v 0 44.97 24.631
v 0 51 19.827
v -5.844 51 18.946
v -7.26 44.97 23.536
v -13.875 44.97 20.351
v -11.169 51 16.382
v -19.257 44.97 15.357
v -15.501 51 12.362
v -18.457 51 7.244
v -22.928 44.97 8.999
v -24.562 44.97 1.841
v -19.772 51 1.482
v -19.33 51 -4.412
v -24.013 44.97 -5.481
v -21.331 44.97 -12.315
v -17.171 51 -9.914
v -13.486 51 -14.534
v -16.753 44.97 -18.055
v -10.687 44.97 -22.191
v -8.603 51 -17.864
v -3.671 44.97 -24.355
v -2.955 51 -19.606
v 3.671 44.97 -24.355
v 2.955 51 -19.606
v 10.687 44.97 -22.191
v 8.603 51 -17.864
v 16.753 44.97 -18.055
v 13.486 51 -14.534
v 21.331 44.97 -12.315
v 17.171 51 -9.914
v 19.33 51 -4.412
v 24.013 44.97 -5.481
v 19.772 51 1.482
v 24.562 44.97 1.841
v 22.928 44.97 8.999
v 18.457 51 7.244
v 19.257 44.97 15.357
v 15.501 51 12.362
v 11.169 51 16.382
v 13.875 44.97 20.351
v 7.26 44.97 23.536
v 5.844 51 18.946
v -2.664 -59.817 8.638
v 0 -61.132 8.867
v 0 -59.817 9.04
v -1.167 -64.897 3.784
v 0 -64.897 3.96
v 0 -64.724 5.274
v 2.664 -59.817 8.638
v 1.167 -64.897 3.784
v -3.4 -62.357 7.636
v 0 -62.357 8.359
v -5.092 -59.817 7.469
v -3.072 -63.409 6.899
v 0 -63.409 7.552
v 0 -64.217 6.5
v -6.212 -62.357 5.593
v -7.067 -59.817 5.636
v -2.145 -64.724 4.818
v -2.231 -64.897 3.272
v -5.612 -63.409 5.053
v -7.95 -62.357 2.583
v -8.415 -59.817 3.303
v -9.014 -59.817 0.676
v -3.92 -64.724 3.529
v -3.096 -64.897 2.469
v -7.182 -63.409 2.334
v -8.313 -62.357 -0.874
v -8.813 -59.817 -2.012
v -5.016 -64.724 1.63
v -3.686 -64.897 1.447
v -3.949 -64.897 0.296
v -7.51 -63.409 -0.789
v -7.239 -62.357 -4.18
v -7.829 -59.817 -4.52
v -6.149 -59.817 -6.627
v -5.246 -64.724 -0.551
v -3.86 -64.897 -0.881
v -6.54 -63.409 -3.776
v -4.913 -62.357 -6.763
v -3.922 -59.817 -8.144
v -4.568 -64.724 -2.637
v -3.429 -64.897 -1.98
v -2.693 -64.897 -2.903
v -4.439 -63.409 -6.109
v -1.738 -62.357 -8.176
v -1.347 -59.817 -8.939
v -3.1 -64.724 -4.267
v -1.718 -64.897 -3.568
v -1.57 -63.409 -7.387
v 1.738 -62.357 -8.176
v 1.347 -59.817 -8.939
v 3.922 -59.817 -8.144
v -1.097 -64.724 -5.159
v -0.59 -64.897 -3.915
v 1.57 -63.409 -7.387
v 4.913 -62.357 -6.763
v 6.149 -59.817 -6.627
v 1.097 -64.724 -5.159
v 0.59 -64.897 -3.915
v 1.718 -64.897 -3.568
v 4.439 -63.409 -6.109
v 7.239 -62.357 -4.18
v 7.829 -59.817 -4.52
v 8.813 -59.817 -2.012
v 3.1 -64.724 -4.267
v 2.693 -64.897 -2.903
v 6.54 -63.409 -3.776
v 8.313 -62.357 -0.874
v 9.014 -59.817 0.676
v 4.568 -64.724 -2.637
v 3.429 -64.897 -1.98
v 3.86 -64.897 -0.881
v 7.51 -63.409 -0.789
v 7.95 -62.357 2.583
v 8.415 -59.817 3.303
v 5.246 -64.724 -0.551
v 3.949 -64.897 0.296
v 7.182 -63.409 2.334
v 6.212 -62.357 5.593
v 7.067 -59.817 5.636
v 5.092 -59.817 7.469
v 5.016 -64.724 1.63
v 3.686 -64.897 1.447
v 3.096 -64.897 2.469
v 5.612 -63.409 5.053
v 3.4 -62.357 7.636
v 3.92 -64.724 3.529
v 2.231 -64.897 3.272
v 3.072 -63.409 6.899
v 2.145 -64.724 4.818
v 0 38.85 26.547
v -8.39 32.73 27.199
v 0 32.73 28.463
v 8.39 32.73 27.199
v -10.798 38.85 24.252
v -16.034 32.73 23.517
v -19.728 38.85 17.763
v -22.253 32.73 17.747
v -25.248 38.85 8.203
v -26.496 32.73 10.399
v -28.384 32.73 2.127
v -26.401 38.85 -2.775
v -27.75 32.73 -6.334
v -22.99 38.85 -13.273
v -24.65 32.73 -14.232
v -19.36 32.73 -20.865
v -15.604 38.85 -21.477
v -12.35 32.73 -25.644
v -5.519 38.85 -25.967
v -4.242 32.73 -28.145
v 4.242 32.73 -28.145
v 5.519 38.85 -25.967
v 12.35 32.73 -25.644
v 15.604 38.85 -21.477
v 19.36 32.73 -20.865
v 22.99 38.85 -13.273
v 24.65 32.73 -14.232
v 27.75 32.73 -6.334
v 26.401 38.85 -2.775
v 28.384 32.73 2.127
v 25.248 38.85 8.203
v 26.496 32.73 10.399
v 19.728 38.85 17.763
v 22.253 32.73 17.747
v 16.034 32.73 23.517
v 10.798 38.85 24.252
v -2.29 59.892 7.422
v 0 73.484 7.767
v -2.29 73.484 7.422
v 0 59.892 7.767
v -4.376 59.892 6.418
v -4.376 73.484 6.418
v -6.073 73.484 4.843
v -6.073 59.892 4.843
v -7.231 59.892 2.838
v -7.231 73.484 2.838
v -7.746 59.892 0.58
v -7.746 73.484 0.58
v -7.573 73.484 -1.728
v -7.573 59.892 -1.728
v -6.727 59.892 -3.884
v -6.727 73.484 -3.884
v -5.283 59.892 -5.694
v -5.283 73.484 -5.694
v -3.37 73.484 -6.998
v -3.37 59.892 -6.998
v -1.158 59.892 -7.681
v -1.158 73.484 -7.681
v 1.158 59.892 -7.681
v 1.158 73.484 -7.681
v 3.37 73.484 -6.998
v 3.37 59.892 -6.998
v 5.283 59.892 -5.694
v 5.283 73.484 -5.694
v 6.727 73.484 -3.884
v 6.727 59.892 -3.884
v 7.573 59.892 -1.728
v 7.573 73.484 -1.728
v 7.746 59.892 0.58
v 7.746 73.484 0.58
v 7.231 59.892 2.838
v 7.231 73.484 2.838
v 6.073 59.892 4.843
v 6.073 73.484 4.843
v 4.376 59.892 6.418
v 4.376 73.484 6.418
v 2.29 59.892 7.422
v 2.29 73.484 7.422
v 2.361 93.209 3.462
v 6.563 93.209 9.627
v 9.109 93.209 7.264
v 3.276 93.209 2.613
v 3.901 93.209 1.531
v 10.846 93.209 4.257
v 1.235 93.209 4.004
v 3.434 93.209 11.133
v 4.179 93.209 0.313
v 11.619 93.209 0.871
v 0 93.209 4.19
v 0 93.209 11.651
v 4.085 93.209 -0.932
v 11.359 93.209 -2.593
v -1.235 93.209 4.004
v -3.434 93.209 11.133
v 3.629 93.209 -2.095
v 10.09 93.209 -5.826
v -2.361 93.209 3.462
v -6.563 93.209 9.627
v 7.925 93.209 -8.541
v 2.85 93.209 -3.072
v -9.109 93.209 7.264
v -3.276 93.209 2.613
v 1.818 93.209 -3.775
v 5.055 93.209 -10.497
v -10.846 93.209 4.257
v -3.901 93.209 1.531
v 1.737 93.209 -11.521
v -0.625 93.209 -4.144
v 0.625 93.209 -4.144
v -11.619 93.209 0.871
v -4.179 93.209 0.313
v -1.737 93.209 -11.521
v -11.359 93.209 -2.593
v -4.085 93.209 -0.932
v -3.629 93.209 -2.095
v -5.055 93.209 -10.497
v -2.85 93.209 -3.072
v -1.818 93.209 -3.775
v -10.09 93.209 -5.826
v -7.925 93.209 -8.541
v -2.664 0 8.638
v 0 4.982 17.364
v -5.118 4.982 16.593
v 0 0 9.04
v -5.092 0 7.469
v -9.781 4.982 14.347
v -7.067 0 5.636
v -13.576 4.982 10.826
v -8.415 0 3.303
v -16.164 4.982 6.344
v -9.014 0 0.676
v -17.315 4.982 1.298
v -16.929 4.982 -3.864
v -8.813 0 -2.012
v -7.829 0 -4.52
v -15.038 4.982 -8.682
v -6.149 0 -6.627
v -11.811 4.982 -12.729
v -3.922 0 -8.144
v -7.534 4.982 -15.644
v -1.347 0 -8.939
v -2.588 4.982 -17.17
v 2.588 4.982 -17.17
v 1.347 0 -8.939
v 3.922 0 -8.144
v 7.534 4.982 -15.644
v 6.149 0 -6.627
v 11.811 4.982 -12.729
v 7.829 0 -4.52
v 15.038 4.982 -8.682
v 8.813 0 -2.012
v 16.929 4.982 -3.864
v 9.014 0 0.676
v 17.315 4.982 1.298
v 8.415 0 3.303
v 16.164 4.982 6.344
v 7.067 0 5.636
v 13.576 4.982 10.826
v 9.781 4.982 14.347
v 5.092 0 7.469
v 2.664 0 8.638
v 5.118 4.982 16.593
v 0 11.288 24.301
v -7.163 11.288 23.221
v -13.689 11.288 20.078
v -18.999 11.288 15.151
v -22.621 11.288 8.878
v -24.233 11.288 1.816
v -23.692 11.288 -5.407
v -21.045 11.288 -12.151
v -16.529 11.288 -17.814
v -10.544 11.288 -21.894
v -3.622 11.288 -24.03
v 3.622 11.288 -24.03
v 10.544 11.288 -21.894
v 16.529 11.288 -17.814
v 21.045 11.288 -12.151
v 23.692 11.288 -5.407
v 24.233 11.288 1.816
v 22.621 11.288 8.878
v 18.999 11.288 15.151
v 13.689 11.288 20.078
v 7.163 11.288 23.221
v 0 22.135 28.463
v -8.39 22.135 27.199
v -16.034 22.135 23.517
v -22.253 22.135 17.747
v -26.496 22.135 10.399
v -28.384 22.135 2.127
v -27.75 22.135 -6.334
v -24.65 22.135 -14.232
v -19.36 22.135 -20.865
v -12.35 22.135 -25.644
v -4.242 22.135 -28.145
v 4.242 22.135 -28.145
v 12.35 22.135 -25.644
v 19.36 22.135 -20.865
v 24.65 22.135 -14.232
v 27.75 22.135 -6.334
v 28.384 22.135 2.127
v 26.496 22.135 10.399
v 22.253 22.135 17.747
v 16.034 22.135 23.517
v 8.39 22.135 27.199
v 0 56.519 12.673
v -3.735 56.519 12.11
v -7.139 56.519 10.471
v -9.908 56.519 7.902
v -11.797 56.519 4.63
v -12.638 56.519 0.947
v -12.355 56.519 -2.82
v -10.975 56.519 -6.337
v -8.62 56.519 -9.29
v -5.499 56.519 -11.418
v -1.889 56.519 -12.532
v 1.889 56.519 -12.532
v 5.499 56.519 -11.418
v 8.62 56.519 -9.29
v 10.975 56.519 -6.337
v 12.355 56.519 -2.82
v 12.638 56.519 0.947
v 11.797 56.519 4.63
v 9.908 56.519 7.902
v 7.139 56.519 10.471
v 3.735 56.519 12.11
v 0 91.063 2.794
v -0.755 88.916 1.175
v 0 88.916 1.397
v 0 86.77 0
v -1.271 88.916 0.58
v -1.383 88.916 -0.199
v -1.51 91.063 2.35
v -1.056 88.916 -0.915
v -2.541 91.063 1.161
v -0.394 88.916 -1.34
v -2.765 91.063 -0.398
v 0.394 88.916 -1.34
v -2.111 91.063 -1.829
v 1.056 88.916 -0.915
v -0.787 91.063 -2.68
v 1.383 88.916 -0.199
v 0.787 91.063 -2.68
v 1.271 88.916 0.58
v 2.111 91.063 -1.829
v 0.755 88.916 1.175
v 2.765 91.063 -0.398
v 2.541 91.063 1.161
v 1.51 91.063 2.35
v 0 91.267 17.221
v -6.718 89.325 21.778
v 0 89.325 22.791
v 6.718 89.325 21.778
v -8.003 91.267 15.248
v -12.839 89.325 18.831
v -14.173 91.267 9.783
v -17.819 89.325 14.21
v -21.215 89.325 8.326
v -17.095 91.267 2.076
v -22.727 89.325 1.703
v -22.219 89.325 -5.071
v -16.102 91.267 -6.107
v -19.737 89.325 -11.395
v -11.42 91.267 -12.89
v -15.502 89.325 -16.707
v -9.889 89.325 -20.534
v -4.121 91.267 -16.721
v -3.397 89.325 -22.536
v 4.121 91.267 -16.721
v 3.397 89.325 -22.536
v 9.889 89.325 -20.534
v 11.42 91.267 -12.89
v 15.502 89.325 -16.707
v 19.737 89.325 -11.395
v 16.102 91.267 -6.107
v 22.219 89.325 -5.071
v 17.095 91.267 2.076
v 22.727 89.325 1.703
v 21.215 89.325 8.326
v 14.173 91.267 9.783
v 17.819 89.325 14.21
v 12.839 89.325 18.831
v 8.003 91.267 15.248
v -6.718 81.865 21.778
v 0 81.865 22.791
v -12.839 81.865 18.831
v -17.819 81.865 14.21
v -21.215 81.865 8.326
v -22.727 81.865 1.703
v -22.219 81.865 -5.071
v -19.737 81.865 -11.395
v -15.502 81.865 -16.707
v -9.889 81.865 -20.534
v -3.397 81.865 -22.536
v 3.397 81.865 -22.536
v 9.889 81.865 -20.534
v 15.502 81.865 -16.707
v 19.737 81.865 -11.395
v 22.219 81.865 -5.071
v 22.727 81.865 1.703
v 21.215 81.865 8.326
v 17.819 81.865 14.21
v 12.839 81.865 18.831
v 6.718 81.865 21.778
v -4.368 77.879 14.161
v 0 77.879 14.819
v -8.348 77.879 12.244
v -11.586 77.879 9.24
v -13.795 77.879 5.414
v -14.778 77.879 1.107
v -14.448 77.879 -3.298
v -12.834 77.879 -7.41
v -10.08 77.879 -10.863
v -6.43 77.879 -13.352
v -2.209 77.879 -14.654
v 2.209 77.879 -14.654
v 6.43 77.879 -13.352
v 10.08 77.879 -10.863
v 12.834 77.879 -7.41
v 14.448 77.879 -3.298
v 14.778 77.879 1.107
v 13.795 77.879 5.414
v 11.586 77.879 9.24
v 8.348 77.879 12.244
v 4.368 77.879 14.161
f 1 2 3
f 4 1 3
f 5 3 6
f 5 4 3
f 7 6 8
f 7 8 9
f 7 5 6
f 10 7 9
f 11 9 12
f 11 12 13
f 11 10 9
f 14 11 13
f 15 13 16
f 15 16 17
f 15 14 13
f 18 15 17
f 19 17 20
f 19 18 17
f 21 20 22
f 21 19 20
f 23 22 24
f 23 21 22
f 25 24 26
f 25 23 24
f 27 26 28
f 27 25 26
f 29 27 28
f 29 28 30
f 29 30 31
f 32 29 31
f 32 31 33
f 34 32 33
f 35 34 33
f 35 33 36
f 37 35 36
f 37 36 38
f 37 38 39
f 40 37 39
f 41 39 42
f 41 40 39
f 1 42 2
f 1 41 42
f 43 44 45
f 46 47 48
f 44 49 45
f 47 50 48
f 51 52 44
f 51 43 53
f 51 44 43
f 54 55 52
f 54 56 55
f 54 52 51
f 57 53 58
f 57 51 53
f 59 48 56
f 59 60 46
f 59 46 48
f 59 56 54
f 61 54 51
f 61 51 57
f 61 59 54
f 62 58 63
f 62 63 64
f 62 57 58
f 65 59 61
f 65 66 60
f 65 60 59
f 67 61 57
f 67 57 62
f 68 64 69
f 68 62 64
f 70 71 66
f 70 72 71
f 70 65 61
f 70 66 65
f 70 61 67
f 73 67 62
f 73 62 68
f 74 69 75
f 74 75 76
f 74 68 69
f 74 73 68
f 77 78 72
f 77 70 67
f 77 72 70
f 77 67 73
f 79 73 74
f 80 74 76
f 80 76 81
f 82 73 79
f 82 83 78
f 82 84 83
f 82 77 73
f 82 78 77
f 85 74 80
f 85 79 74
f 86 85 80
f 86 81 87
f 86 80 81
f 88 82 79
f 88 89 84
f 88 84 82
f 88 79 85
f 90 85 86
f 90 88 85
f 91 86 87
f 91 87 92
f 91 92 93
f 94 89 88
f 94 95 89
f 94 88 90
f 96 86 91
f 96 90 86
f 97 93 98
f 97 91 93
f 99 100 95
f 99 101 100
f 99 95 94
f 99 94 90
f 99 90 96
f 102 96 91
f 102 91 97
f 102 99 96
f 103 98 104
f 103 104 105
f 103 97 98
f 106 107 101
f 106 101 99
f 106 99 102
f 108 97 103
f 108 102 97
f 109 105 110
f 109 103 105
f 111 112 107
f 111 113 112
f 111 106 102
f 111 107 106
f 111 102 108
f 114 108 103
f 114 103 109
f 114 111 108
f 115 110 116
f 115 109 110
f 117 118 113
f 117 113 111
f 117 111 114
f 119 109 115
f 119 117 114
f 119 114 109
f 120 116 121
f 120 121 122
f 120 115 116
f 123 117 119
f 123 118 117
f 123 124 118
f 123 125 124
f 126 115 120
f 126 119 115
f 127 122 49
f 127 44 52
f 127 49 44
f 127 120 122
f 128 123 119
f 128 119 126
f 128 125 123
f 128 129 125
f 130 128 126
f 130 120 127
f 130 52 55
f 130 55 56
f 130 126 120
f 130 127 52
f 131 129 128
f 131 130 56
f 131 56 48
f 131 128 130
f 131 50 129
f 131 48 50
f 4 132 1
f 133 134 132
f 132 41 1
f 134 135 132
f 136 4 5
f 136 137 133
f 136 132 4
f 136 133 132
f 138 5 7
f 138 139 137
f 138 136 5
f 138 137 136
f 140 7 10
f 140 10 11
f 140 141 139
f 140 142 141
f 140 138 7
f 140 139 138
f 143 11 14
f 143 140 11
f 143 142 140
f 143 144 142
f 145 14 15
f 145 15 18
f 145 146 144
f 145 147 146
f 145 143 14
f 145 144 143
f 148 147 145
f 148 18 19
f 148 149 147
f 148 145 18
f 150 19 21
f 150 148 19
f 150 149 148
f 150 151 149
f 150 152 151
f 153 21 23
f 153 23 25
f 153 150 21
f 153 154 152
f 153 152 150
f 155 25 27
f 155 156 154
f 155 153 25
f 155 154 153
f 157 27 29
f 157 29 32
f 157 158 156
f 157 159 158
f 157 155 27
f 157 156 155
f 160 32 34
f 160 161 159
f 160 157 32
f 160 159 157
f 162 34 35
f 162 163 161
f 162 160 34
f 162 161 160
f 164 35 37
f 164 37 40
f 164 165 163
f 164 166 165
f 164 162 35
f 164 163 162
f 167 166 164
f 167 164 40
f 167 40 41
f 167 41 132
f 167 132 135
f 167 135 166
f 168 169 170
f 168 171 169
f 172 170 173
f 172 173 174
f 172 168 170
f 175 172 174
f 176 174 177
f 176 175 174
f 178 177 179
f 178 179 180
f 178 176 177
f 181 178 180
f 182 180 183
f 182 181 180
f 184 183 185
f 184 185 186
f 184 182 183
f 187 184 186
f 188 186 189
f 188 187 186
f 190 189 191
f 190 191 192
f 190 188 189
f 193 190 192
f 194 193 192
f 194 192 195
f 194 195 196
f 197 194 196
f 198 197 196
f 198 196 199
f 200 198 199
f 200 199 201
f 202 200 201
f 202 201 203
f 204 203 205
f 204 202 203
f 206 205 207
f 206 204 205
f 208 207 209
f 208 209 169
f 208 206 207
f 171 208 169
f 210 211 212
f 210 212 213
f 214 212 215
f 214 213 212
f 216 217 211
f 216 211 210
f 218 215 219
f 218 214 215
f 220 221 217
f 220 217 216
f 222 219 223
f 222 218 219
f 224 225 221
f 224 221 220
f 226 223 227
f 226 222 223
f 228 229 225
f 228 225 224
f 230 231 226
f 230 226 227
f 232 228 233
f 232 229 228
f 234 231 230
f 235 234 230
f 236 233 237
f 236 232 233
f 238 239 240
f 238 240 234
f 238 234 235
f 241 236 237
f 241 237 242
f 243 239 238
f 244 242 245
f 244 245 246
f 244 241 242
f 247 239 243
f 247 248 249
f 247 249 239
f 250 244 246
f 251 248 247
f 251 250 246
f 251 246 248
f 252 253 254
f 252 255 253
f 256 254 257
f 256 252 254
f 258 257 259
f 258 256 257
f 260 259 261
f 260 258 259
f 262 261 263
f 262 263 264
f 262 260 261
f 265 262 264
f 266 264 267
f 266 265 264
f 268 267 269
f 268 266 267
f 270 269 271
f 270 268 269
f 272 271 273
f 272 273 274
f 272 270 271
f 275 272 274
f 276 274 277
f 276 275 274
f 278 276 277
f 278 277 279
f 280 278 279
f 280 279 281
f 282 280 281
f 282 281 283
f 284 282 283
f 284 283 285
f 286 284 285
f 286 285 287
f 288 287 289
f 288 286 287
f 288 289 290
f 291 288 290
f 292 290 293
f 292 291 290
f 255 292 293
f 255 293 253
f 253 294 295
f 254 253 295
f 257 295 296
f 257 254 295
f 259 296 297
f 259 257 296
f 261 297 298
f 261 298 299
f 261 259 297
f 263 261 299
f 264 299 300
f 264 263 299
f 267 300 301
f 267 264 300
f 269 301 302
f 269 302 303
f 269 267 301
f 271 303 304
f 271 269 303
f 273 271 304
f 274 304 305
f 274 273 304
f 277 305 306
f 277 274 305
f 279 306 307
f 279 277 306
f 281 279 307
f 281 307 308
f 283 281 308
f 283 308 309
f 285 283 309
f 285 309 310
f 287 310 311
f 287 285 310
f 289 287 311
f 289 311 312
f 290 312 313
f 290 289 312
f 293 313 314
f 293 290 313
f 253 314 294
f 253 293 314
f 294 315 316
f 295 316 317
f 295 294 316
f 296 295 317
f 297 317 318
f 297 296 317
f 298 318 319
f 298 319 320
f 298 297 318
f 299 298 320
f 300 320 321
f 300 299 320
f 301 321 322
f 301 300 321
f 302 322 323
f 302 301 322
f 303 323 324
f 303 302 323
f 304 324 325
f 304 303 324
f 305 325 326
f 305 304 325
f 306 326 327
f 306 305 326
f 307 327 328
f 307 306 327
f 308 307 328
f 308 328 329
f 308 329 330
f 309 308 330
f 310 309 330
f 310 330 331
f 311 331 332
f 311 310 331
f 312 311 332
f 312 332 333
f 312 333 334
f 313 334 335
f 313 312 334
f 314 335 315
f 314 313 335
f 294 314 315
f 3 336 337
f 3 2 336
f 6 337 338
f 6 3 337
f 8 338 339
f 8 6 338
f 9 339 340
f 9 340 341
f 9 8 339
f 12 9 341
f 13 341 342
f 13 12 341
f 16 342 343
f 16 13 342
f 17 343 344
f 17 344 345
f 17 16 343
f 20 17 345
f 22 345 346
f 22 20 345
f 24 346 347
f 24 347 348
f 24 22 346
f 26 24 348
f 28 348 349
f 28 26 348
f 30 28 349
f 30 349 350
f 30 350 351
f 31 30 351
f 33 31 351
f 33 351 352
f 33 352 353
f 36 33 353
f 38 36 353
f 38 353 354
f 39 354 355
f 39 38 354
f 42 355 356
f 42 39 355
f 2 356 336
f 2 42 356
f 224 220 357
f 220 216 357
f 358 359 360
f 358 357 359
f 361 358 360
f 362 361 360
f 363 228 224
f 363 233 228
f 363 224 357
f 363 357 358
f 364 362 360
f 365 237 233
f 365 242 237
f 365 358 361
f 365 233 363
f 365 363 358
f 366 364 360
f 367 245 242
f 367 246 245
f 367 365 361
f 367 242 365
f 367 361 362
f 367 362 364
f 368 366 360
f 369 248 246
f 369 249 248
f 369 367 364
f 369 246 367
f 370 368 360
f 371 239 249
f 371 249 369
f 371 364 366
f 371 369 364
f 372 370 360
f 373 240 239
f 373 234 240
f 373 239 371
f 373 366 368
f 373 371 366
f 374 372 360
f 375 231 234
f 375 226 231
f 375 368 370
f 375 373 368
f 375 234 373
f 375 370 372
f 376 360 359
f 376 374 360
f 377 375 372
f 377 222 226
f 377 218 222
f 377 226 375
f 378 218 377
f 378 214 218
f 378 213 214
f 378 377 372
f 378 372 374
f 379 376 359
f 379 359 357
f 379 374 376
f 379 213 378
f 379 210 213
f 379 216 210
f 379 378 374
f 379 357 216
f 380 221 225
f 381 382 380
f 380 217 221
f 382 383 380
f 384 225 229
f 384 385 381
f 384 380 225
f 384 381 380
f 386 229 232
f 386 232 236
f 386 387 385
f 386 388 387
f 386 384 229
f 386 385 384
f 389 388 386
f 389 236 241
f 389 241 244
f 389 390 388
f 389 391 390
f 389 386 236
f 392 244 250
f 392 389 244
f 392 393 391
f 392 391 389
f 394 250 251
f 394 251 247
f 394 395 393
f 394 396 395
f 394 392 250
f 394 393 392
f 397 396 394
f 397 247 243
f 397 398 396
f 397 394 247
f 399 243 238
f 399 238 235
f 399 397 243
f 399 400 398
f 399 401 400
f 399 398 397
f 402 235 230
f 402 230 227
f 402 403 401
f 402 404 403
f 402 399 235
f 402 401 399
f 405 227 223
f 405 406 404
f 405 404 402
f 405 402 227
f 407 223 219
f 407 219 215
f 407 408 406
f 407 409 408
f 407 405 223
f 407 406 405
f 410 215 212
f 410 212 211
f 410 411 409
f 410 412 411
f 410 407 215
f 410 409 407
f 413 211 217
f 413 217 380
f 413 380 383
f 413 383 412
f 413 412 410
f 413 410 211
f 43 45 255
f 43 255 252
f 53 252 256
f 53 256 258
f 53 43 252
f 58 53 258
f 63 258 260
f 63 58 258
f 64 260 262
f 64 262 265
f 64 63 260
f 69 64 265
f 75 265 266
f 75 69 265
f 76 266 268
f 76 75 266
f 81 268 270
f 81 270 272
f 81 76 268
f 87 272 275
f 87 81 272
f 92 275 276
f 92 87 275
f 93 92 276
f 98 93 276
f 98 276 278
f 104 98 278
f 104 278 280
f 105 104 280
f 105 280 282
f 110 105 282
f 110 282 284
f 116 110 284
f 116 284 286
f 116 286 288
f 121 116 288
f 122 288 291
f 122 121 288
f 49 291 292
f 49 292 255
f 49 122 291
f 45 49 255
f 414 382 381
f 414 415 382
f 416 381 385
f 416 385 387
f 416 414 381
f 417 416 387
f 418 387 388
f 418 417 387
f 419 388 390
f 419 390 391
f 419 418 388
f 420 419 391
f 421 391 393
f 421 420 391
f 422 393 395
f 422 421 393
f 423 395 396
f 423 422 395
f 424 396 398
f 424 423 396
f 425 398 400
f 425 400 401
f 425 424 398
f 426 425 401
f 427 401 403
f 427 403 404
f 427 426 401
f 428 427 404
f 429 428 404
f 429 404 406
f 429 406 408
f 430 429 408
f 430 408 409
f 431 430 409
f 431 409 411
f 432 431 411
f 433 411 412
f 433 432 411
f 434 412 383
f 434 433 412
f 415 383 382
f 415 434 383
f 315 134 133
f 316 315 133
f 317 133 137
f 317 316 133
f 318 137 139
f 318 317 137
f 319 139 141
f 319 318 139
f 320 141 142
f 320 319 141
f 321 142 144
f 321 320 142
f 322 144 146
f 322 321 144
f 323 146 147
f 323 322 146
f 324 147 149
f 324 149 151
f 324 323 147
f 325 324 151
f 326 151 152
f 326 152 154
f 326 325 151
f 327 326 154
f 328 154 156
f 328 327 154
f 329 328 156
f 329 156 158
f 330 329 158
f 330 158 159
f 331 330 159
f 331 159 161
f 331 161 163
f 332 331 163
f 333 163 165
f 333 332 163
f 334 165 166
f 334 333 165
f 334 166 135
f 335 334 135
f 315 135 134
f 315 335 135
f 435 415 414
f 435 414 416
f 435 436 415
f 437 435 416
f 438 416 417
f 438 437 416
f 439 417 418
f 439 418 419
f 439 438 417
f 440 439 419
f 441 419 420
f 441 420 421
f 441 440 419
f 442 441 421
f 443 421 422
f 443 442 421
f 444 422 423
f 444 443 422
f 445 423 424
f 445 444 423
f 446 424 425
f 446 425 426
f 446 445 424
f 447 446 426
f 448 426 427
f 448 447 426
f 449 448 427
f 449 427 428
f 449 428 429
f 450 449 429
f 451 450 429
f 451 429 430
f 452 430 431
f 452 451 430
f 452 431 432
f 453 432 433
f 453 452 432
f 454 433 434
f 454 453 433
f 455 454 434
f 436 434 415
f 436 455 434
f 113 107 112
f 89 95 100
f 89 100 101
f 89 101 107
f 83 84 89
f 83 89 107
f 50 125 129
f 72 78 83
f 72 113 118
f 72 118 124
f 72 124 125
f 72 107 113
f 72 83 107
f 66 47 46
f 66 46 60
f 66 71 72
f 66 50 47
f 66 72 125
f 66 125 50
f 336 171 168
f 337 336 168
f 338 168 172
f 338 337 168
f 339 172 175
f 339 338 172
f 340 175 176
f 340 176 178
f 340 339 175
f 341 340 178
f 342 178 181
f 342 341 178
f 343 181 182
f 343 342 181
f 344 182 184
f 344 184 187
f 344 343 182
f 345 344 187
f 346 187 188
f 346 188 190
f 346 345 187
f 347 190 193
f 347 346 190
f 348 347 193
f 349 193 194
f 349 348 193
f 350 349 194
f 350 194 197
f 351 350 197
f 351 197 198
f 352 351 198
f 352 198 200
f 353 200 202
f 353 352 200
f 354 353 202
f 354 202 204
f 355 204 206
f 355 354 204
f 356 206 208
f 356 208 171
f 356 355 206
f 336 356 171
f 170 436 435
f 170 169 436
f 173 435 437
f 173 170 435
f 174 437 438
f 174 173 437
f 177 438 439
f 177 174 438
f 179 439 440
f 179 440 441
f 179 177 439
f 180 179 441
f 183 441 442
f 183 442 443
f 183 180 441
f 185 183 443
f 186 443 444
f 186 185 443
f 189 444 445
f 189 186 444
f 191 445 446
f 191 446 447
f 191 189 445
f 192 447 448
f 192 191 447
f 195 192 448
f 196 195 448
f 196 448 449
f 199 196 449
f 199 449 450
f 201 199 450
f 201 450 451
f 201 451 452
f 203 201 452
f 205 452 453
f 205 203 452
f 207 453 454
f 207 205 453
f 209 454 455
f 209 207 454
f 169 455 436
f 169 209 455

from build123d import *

# Parameters (mm, degrees)
F2_R = 5.08


with BuildPart() as f1:
    # F0 (on Right) → F1 (revolve)
    with BuildSketch(Plane.YZ):
        Polygon((-64.897239, 0), (0, 0), (86.770147, 0), (93.20876, 4.190467), (93.20876, 11.651084), (89.325145, 22.790901), (81.864543, 22.790901), (77.878736, 14.819287), (73.484123, 7.767476), (59.891507, 7.767476), (56.518897, 12.67308), (51.000088, 19.827098), (44.970281, 24.630502), (32.7297, 28.463185), (22.135049, 28.463185), (11.288136, 24.301), (4.981786, 17.364018), (0, 9.039648), (-64.897239, 9.039648), align=None)
    revolve(axis=Axis((0, -32.44862, 0), (0, -1, 0)))

    # F2
    f2_edges = [f1.edges().sort_by_distance(p)[0] for p in [
        (0, -64.897239, -9.039648),
    ]]
    fillet(f2_edges, radius=F2_R)


solid = f1.part
